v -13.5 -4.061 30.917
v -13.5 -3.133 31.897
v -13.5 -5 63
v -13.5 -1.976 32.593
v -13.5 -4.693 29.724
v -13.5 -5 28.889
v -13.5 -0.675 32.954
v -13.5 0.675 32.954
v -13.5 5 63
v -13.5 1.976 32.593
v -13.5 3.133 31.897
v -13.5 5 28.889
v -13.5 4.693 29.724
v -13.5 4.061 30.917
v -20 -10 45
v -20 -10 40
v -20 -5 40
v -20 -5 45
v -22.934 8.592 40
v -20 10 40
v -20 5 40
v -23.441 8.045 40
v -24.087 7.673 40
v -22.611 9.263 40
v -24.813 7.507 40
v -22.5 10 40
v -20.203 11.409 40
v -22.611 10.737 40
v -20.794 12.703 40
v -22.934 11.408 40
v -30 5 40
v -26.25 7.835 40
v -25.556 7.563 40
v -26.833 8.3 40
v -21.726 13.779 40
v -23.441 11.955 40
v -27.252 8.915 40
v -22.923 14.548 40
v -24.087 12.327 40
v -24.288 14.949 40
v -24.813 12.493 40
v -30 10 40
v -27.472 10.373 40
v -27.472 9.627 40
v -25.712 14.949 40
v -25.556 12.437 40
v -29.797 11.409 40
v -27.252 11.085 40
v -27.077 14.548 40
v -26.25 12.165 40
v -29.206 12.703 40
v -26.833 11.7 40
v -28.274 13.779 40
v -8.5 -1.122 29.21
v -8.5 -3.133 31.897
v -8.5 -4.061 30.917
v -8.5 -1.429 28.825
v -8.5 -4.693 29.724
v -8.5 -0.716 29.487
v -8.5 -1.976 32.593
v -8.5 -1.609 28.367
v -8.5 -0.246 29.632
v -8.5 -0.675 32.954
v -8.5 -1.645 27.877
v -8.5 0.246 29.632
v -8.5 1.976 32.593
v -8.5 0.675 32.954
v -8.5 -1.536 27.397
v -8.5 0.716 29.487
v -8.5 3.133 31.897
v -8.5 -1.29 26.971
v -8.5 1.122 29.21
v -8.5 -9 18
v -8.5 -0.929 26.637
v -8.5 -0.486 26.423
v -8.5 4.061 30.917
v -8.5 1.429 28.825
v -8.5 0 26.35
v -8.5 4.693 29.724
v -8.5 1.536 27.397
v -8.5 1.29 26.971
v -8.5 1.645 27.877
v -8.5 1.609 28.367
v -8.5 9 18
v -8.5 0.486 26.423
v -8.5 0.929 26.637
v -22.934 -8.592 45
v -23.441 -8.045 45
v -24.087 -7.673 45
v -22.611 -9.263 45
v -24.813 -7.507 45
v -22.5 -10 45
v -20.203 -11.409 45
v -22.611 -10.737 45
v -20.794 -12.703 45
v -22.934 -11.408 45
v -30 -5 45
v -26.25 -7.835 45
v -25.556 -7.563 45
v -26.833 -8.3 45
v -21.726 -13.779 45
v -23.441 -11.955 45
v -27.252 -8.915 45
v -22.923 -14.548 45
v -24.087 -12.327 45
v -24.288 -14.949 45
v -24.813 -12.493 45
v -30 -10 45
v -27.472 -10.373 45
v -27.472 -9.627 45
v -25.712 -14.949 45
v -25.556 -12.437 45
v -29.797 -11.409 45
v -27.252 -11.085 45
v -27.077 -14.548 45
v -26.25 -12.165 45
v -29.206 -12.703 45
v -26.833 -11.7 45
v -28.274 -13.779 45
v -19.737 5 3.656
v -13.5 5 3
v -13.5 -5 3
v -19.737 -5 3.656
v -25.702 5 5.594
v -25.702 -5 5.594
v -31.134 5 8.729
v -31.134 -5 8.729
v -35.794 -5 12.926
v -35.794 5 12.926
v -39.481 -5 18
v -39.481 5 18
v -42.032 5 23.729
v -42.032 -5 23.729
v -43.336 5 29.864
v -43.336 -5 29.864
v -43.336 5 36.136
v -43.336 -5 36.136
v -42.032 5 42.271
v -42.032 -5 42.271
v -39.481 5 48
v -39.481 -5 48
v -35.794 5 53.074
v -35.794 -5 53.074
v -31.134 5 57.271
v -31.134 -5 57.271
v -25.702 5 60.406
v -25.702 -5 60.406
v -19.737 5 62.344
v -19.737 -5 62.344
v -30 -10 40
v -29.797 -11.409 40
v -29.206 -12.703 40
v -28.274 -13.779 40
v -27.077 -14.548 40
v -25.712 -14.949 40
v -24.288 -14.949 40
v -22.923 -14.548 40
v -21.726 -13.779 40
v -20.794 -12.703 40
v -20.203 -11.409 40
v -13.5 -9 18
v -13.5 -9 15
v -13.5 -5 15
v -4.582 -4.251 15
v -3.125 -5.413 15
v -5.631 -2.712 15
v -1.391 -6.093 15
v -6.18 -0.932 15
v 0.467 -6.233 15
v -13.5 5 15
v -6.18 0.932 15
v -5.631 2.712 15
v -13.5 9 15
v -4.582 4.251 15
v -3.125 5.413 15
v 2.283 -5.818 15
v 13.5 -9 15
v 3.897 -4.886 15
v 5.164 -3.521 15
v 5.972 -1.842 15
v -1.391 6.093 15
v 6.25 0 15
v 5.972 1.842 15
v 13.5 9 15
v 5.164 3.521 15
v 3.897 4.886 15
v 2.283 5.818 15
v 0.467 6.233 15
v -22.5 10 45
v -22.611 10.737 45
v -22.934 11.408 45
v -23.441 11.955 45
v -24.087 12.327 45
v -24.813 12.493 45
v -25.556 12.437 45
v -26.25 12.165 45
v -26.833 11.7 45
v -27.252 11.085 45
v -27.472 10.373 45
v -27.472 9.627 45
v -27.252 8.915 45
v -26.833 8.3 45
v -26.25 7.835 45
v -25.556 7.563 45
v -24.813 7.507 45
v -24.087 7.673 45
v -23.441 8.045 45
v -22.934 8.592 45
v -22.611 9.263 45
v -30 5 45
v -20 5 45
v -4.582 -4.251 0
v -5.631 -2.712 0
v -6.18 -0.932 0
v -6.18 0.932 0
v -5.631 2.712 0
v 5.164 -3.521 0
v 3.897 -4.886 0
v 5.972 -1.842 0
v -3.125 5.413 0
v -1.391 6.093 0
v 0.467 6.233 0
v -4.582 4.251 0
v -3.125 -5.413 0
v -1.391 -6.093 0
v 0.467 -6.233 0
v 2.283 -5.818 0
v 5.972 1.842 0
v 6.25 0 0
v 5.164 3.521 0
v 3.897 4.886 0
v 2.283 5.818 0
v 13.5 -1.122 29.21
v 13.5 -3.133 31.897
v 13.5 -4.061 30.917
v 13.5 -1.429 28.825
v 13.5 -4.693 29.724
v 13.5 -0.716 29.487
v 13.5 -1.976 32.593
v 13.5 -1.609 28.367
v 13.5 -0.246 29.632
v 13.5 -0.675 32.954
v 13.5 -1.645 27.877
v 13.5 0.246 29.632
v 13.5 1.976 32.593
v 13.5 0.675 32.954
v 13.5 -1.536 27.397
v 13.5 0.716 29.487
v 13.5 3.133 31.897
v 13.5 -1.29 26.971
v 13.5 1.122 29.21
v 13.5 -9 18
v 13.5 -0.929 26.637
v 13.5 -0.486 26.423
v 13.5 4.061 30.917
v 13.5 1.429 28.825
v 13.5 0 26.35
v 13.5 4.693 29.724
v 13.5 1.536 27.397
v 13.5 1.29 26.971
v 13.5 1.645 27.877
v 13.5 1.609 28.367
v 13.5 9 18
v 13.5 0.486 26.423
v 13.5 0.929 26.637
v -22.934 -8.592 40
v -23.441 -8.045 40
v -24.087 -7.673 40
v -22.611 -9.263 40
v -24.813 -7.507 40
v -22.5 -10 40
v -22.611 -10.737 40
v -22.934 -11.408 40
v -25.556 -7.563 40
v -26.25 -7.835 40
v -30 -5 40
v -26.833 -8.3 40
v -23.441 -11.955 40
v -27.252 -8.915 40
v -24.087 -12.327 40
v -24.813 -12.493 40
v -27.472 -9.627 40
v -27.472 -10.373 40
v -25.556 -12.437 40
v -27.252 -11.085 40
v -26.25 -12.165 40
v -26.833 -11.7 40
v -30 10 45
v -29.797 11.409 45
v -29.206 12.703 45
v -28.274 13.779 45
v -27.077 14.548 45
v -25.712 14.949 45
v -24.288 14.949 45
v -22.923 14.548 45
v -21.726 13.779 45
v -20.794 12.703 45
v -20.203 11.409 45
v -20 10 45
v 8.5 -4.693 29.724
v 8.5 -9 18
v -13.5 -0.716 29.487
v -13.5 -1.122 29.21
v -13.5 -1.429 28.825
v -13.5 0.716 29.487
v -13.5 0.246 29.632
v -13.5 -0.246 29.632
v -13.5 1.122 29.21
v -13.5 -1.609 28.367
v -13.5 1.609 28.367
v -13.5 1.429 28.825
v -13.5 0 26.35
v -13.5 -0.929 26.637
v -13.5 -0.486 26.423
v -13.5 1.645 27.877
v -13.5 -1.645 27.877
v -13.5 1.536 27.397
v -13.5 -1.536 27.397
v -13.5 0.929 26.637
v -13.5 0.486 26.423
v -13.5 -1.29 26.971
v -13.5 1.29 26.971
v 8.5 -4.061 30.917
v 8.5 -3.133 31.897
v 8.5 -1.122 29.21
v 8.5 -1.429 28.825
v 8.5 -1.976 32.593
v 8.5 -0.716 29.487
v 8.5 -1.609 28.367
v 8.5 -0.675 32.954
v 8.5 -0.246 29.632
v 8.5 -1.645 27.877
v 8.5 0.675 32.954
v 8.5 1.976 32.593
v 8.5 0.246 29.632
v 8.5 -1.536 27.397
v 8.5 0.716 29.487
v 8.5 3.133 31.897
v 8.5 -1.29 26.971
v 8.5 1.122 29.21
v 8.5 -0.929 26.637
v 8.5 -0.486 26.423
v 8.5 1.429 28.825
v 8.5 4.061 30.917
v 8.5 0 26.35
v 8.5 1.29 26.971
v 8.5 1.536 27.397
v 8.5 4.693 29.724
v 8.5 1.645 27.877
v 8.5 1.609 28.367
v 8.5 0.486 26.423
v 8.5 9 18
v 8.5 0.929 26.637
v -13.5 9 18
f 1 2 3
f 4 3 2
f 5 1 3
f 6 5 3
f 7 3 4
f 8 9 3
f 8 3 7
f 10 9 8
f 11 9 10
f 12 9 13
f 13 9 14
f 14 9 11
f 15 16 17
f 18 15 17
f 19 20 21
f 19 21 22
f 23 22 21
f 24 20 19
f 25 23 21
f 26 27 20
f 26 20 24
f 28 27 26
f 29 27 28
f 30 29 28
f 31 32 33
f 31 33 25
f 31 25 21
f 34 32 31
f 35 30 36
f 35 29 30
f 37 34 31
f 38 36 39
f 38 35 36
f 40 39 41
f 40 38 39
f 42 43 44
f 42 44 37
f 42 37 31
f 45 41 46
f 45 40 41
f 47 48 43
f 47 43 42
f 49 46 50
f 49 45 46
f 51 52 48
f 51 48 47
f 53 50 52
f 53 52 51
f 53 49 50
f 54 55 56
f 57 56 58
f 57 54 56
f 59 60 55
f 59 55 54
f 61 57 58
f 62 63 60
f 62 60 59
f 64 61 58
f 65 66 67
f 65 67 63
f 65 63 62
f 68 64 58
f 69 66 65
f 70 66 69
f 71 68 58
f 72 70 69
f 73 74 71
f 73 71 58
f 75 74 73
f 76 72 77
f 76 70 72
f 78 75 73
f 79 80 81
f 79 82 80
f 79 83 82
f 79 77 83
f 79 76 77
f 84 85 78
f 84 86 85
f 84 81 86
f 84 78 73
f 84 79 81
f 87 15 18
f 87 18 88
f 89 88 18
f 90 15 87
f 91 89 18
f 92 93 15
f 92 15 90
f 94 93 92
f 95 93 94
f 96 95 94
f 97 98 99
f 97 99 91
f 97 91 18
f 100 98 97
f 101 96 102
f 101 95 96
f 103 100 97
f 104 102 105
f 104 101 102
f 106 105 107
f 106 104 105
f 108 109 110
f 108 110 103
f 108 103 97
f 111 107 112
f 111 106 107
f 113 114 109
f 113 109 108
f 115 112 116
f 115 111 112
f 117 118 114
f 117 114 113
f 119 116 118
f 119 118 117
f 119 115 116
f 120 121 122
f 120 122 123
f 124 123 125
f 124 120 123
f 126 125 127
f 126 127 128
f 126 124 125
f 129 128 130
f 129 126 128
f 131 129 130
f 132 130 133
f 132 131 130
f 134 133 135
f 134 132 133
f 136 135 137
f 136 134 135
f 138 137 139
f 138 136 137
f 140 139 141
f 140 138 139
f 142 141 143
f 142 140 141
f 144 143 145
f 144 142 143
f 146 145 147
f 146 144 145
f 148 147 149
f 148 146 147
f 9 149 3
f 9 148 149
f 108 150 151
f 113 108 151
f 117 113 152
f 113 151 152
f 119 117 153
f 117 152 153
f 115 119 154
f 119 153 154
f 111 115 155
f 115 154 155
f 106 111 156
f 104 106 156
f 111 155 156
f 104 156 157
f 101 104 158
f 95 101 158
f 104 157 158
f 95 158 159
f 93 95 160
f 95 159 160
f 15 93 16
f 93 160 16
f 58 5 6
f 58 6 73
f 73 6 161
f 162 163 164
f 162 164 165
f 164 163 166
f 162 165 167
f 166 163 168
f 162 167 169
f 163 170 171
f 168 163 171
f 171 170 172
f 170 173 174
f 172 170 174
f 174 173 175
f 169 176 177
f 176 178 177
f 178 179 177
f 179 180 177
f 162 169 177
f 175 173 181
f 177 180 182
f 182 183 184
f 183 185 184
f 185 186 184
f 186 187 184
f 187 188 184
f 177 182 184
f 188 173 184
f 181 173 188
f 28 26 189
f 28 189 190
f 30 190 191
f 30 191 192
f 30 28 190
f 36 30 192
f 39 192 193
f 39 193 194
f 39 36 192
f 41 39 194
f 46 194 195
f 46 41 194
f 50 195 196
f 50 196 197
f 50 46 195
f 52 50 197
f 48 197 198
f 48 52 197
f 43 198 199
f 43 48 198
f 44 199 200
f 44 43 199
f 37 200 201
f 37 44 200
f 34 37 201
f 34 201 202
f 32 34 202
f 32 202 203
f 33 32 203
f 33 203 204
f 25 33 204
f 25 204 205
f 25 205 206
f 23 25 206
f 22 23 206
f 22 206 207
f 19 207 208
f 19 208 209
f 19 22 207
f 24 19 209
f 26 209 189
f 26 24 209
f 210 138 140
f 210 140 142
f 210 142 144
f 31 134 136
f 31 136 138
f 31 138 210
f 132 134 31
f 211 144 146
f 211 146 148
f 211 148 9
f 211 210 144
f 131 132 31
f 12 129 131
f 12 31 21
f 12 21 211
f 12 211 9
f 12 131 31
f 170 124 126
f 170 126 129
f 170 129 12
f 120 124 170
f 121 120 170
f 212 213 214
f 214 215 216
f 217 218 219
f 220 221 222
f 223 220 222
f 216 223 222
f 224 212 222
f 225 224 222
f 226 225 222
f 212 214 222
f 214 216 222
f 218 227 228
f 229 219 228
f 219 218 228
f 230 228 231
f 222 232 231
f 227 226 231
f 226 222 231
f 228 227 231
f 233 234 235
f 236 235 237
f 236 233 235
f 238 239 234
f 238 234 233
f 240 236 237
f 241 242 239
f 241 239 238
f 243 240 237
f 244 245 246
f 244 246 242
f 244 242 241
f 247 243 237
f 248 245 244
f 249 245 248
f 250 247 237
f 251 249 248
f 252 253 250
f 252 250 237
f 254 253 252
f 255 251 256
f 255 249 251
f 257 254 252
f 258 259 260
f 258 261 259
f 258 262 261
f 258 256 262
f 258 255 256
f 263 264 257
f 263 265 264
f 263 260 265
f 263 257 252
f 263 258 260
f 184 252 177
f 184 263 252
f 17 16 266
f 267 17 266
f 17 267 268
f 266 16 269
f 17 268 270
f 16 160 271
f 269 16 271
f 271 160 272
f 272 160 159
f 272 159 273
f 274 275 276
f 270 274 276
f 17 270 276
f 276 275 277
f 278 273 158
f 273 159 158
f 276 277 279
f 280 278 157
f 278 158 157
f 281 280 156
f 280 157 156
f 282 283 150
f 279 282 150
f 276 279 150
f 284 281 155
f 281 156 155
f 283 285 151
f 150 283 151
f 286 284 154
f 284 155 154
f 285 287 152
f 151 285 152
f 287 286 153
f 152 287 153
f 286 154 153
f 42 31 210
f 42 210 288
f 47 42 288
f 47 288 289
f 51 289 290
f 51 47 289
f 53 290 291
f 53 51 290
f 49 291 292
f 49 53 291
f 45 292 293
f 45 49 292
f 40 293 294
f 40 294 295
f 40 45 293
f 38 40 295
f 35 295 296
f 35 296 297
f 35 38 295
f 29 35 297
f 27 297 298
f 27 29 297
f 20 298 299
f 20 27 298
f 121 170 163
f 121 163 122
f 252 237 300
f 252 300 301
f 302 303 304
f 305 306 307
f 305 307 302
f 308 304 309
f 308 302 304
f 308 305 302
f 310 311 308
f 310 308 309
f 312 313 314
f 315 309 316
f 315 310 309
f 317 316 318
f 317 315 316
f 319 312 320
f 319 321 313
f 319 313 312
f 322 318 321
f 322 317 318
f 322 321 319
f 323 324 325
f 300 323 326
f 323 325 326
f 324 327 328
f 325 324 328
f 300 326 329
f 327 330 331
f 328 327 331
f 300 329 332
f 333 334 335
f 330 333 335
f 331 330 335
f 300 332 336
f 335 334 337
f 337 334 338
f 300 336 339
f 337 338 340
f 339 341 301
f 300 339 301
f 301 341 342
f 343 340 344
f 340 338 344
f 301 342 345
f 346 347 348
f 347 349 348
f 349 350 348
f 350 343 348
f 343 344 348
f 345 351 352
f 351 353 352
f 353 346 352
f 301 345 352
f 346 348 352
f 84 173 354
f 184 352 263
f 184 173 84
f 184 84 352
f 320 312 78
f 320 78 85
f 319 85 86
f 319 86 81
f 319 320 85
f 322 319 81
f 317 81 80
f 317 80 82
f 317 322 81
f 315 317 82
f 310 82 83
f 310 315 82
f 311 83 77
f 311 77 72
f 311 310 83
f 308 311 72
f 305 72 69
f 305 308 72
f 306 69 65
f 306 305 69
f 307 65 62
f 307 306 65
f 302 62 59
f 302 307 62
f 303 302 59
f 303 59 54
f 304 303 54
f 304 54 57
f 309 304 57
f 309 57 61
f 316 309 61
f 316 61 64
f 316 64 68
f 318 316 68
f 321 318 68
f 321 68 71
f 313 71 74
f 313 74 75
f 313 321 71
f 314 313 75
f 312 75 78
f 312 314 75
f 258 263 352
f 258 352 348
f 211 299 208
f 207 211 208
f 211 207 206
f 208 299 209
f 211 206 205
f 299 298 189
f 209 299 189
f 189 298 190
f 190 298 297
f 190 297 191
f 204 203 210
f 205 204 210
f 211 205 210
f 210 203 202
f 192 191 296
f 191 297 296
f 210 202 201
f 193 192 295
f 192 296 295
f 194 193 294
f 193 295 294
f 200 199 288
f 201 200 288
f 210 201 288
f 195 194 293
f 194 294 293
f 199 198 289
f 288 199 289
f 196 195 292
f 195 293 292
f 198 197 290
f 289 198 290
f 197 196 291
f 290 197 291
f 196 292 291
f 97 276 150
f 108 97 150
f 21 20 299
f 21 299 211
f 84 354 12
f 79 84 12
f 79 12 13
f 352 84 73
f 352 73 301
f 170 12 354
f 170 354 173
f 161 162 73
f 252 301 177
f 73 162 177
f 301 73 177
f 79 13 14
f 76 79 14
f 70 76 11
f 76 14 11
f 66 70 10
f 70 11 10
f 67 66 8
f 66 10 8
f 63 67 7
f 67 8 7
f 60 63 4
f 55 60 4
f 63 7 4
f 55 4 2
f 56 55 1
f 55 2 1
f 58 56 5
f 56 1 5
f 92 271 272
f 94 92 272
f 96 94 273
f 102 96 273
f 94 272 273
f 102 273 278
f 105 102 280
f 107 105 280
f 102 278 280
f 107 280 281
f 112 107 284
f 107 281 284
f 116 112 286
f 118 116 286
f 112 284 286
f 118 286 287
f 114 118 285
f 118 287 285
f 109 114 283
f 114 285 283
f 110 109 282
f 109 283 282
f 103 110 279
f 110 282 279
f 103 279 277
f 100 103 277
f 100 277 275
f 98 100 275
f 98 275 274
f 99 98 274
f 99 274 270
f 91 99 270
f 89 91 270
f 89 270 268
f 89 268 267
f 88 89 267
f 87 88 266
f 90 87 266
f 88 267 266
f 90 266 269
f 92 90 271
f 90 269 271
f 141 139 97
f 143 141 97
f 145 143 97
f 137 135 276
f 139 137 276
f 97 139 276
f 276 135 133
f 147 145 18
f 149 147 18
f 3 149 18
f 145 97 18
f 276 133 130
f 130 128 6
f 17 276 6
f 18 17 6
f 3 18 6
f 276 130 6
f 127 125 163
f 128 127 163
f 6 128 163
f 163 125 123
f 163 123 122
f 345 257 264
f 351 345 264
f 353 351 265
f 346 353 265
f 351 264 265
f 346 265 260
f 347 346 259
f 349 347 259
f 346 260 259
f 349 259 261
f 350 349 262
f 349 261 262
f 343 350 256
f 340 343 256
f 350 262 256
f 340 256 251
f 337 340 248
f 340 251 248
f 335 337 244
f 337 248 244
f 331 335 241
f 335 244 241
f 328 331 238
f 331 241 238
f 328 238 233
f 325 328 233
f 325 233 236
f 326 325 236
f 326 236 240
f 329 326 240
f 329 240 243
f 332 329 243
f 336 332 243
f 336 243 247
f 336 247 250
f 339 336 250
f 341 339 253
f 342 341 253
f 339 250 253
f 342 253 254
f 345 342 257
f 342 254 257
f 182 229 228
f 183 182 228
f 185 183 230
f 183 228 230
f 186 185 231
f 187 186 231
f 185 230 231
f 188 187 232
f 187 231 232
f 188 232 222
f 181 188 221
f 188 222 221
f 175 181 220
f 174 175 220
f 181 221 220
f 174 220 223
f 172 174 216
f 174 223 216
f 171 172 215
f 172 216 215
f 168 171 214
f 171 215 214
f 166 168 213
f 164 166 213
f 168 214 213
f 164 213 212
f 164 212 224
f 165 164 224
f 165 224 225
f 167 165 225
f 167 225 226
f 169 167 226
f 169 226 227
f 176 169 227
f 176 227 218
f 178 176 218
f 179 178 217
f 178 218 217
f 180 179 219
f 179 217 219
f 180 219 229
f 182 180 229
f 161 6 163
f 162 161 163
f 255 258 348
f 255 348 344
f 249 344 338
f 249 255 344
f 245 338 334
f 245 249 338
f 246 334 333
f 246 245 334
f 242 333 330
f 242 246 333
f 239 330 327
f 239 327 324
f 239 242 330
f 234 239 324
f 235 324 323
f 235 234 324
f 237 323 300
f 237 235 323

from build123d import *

# Parameters (mm, degrees)
SKETCH_1_R      = 6.25
EXTRUDE_1_DEPTH = 15
SKETCH_2_W      = 27
SKETCH_2_H      = 18
EXTRUDE_2_DEPTH = 3
EXTRUDE_START   = 13.5
SKETCH_3_R      = 1.65
EXTRUDE_3_DEPTH = 5
EXTRUDE_START_2 = -13.5
SKETCH_3_2_R    = 1.65
EXTRUDE_4_DEPTH = 5
EXTRUDE_5_DEPTH = 5
SKETCH_5_R      = 2.5
EXTRUDE_6_DEPTH = 5


with BuildPart() as part:
    # ｽｹｯﾁ1 → ﾎﾞｽ - 押し出し1 (new body)
    with BuildSketch(Plane.XY):
        Circle(SKETCH_1_R)
    extrude(amount=EXTRUDE_1_DEPTH)

    # ｽｹｯﾁ2 → ﾎﾞｽ - 押し出し2 (add)
    with BuildSketch(Plane.XY.offset(15)):
        Rectangle(SKETCH_2_W, SKETCH_2_H)
    extrude(amount=EXTRUDE_2_DEPTH)

    # ｽｹｯﾁ3 → ﾎﾞｽ - 押し出し3 (add)
    with BuildSketch(Plane(origin=(0, 0, 0), x_dir=(0, 0, -1), z_dir=(1, 0, 0)).offset(EXTRUDE_START)):
        with BuildLine():
            Line((-18, 9), (-29.724032154, 4.69336906))
            ThreePointArc((-29.724032154, 4.69336906), (-33, 0), (-29.724032154, -4.69336906))
            Line((-29.724032154, -4.69336906), (-18, -9))
            Line((-18, -9), (-18, 9))
        make_face()
        with Locations((-28, 0)):
            Circle(SKETCH_3_R, mode=Mode.SUBTRACT)
    extrude(amount=-EXTRUDE_3_DEPTH)

    # ｽｹｯﾁ3<2> → ﾎﾞｽ - 押し出し4 (add)
    with BuildSketch(Plane(origin=(0, 0, 0), x_dir=(0, 0, -1), z_dir=(1, 0, 0)).offset(EXTRUDE_START_2)):
        with BuildLine():
            Line((-18, 9), (-29.724032154, 4.69336906))
            ThreePointArc((-29.724032154, 4.69336906), (-33, 0), (-29.724032154, -4.69336906))
            Line((-29.724032154, -4.69336906), (-18, -9))
            Line((-18, -9), (-18, 9))
        make_face()
        with Locations((-28, 0)):
            Circle(SKETCH_3_2_R, mode=Mode.SUBTRACT)
    extrude(amount=EXTRUDE_4_DEPTH)

    # ｽｹｯﾁ4 → ﾎﾞｽ - 押し出し5 (add, symmetric)
    with BuildSketch(Plane(origin=(0, 0, 0), x_dir=(1, 0, 0), z_dir=(0, 1, 0))):
        with BuildLine():
            Line((-13.5, -63), (-13.5, -3))
            ThreePointArc((-13.5, -3), (-43.5, -33), (-13.5, -63))
        make_face()
    extrude(amount=EXTRUDE_5_DEPTH, both=True)

    # ｽｹｯﾁ5 → ﾎﾞｽ - 押し出し6 (add)
    with BuildSketch(Plane.XY.offset(40)):
        with BuildLine():
            Line((-30, 5), (-30, 10))
            ThreePointArc((-30, 10), (-25, 15), (-20, 10))
            Line((-20, 10), (-20, 5))
            Line((-20, 5), (-30, 5))
        make_face()
        with Locations((-25, 10)):
            Circle(SKETCH_5_R, mode=Mode.SUBTRACT)
    extrude_6 = extrude(amount=EXTRUDE_6_DEPTH)

    # ﾐﾗｰ1: ﾎﾞｽ - 押し出し6 across plane
    add(extrude_6.mirror(Plane.ZX))


solid = part.part
